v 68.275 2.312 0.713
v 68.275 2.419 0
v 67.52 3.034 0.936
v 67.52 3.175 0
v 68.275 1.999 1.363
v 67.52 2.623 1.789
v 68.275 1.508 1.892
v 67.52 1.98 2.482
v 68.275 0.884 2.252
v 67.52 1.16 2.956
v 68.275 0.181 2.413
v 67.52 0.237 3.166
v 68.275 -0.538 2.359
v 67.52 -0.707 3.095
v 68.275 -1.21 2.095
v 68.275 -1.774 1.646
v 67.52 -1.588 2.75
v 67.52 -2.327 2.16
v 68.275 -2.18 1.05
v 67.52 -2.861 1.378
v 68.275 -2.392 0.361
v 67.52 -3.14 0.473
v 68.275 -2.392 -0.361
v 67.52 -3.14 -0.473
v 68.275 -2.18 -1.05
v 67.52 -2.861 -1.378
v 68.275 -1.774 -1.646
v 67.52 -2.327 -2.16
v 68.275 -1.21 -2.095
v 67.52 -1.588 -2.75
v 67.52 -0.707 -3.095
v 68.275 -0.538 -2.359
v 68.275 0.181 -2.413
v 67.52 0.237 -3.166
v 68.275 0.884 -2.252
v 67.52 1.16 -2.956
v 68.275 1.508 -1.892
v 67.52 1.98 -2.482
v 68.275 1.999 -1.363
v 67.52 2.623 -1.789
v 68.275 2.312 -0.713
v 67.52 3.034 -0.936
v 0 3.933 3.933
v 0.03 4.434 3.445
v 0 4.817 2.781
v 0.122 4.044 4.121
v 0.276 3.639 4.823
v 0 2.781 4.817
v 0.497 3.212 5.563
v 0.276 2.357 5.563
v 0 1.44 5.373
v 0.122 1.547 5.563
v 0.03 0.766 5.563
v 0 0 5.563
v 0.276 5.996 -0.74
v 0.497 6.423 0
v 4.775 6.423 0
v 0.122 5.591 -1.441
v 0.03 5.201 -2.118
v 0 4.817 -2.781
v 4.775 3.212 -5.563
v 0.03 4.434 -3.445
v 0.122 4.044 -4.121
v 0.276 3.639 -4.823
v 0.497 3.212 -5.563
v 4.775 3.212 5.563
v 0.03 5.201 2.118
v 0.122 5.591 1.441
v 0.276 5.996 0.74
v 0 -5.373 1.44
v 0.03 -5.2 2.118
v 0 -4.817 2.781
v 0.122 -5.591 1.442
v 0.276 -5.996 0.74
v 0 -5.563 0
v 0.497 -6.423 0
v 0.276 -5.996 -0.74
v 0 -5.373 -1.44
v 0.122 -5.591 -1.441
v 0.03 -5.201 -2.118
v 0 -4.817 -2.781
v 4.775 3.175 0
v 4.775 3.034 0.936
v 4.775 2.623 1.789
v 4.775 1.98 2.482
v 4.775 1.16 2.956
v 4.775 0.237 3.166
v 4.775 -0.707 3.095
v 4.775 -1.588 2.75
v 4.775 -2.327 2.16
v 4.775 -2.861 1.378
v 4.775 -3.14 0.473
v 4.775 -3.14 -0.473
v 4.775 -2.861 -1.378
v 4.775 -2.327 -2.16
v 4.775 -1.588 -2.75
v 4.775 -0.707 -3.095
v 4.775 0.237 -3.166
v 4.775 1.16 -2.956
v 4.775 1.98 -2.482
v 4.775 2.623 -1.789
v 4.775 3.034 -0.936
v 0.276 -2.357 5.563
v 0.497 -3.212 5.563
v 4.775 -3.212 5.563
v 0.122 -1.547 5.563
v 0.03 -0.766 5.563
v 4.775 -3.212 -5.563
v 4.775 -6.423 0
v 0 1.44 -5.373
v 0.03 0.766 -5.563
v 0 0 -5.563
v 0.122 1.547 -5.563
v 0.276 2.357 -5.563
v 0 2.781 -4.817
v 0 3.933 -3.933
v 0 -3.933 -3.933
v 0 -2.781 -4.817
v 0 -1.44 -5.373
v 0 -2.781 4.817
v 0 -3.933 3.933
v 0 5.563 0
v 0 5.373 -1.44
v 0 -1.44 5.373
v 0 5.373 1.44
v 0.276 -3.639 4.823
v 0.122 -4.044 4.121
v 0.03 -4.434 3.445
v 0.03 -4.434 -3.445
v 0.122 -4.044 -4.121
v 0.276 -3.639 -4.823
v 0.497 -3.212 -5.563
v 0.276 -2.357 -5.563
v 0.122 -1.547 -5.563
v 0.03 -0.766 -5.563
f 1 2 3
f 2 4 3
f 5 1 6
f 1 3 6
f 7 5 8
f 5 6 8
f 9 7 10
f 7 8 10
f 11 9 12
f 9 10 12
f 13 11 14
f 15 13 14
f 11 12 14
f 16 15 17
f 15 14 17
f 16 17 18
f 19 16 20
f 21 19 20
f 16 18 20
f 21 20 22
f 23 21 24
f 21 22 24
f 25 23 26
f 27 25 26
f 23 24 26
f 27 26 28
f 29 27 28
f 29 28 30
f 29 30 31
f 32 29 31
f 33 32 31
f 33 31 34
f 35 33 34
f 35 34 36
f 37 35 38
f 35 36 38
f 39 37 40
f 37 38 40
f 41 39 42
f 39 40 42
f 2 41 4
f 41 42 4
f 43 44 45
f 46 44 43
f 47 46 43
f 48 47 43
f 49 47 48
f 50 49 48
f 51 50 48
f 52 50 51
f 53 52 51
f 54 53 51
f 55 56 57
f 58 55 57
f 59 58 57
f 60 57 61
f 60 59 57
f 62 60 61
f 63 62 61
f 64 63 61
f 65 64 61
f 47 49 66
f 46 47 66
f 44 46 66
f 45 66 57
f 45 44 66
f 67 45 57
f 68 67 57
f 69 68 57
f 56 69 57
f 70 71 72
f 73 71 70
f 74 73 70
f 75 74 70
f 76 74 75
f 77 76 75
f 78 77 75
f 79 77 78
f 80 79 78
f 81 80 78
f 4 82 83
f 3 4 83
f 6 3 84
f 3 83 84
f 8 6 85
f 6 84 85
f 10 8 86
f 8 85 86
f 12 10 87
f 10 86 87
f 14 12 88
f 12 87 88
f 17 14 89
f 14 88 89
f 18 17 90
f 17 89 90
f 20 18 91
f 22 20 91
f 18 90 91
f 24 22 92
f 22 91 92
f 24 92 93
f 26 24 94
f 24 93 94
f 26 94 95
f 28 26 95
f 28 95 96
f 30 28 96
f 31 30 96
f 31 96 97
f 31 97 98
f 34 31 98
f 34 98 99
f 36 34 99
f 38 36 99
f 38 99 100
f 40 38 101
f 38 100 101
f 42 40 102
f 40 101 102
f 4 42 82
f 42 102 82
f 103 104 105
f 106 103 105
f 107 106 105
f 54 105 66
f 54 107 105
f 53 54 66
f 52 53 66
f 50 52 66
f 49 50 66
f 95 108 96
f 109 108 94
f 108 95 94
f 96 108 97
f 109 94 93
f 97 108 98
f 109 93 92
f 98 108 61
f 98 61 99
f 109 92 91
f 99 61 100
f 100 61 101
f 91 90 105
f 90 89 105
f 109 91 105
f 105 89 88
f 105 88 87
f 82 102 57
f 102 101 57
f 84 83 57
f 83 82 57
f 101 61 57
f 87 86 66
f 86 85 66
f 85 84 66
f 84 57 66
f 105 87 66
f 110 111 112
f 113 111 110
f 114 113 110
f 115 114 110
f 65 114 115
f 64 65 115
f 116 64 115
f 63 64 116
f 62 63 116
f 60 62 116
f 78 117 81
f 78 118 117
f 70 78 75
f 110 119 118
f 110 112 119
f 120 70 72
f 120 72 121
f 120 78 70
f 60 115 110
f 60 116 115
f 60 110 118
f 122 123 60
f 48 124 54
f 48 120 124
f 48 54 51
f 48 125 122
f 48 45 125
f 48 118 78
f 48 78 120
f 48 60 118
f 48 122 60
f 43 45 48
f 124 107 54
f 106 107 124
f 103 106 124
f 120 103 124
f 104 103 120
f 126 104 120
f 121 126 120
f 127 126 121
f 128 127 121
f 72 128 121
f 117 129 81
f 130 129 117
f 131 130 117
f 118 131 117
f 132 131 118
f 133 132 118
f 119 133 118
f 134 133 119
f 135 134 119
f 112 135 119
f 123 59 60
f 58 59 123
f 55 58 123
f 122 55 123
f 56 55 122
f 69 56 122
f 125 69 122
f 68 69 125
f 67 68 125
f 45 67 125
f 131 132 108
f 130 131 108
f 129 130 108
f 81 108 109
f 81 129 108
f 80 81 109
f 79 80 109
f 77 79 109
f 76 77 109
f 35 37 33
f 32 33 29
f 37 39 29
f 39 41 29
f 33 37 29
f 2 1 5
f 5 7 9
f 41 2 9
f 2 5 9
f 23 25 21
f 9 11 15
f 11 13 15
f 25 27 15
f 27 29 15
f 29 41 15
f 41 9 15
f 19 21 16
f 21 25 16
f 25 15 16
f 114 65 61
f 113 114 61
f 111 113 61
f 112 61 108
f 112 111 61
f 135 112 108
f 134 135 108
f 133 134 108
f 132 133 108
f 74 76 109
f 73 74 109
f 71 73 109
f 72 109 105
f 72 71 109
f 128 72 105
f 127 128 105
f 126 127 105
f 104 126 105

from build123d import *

# Parameters (mm, degrees)
BASEHEAD_DEPTH = 4.7752


with BuildPart() as part:
    # Sketch1 → BaseHead (new body)
    with BuildSketch(Plane(origin=(0, 0, 0), x_dir=(0, 0, -1), z_dir=(1, 0, 0))):
        Polygon((5.5626, 3.211568607), (5.5626, -3.211568607), (0, -6.423137215), (-5.5626, -3.211568607), (-5.5626, 3.211568607), (0, 6.423137215), align=None)
    extrude(amount=BASEHEAD_DEPTH)

    # BodySke → BaseBody (revolve)
    with BuildSketch(Plane.XY):
        Polygon((0, 0), (68.2752, 0), (68.2752, 2.41935), (67.51955, 3.175), (0, 3.175), align=None)
    revolve(axis=Axis((0, 0, 0), (1, 0, 0)))

    # Sketch3 → HeadChamfer (revolve, cut)
    with BuildSketch(Plane.XY):
        Polygon((0, 5.5626), (4.163005602, 12.773137215), (4.163005602, 19.123137215), (-12.7, 19.123137215), (-12.7, 5.5626), align=None)
    revolve(axis=Axis((0, 0, 0), (1, 0, 0)), mode=Mode.SUBTRACT)


solid = part.part
